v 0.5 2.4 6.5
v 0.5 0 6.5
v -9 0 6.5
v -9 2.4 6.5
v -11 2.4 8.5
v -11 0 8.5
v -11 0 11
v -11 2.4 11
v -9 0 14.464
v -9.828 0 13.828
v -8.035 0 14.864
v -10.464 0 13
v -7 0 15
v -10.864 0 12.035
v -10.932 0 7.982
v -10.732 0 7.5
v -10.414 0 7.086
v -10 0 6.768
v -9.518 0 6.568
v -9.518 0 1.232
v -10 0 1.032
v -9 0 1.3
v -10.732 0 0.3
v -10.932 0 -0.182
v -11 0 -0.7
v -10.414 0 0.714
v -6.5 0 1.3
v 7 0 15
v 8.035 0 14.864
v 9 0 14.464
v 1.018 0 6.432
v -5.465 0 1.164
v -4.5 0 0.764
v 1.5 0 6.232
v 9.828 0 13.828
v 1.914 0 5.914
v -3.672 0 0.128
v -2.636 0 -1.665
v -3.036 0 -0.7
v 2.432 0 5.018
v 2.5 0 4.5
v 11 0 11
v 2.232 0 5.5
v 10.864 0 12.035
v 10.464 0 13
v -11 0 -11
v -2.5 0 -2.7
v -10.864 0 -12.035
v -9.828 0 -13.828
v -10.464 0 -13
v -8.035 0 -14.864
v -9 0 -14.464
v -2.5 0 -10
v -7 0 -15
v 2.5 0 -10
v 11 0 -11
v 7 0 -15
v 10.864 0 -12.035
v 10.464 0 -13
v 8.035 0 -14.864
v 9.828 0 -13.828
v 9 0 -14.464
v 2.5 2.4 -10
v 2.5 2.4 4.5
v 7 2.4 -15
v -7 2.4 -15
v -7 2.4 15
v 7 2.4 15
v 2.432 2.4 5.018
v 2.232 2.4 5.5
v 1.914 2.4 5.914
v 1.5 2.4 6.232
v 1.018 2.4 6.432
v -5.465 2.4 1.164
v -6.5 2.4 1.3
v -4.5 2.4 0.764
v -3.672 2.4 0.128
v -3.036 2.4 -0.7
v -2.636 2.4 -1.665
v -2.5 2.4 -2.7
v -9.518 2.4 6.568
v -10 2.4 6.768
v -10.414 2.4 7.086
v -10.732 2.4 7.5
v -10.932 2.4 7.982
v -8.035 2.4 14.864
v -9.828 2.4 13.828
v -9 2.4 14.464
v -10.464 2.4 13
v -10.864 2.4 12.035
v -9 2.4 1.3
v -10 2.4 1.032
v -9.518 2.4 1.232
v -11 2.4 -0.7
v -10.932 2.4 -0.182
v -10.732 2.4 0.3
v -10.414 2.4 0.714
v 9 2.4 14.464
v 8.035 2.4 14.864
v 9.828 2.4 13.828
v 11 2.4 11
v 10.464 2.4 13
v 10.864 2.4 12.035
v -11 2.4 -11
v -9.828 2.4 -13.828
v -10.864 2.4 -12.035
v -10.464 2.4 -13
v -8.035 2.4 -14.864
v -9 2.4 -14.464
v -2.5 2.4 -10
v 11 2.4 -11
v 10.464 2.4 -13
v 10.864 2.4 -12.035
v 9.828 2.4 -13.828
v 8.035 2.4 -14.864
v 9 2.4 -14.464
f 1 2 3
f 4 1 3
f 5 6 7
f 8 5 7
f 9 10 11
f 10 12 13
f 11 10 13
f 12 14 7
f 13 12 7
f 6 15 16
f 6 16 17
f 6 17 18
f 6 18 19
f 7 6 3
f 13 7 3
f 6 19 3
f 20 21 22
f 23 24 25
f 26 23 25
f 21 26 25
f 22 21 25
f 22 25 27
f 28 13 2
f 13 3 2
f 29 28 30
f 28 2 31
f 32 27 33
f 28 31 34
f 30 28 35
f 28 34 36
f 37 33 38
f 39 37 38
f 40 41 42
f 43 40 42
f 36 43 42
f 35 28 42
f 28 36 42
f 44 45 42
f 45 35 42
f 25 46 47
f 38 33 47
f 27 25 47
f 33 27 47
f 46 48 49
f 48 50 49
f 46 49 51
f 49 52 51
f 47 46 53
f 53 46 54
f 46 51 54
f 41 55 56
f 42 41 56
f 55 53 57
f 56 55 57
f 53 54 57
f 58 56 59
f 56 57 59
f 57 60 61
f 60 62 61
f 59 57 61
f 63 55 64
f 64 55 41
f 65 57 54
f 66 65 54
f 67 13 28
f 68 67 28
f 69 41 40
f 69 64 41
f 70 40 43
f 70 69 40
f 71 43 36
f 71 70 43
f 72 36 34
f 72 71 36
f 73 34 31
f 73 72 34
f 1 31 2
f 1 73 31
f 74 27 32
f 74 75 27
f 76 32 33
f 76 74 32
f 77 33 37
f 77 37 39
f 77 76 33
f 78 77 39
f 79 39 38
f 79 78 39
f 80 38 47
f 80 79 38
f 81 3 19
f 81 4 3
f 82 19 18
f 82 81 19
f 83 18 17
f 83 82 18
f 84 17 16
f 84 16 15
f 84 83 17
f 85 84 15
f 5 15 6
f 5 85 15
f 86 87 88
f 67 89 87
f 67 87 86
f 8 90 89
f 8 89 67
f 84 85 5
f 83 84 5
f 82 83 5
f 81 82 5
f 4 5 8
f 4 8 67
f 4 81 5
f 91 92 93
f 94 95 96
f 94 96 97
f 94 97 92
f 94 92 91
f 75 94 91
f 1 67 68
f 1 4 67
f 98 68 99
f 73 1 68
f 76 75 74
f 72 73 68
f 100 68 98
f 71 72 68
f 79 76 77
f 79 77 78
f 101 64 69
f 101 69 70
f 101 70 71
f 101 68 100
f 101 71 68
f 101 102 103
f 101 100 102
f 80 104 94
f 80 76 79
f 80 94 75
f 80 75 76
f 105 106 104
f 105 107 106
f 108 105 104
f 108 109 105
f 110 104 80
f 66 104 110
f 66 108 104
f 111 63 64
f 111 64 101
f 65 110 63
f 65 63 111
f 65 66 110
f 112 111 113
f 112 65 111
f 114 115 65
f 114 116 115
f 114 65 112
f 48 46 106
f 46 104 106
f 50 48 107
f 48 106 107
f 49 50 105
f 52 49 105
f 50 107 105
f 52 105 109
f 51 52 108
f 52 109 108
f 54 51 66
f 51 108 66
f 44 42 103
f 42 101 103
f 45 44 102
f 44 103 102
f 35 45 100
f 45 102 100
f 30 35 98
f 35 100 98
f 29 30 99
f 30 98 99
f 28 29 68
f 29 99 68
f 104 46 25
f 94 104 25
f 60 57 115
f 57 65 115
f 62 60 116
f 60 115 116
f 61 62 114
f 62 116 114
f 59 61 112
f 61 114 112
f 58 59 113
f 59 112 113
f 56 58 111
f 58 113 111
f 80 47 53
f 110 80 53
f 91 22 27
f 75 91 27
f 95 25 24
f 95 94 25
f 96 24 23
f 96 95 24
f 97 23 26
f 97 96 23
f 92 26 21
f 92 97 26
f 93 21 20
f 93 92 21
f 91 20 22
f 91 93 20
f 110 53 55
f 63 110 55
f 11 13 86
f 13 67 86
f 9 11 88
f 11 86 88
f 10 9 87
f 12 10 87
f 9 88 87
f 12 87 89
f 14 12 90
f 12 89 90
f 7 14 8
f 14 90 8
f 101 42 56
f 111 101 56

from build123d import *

# Parameters (mm, degrees)
BOSS_EXTRUDE1_DEPTH = 2.4
FILLET1_R           = 4
FILLET2_R           = 4
FILLET3_R           = 2


with BuildPart() as part:
    # Sketch1 → Boss-Extrude1 (new body)
    with BuildSketch(Plane(origin=(0, 0, 0), x_dir=(1, 0, 0), z_dir=(0, 1, 0))):
        Polygon((-11, -15), (11, -15), (11, 15), (-11, 15), (-11, -1.3), (-2.5, -1.3), (-2.5, 10), (2.5, 10), (2.5, -6.5), (-2.5, -6.5), (-11, -6.5), align=None)
    extrude(amount=BOSS_EXTRUDE1_DEPTH)

    # Fillet1
    fillet1_edges = [part.edges().sort_by_distance(p)[0] for p in [
        (-2.5, 1.2, 1.3),
    ]]
    fillet(fillet1_edges, radius=FILLET1_R)

    # Fillet2
    fillet2_edges = [part.edges().sort_by_distance(p)[0] for p in [
        (11, 1.2, 15),
        (-11, 1.2, 15),
        (-11, 1.2, -15),
        (11, 1.2, -15),
    ]]
    fillet(fillet2_edges, radius=FILLET2_R)

    # Fillet3
    fillet3_edges = [part.edges().sort_by_distance(p)[0] for p in [
        (-11, 1.2, 6.5),
        (2.5, 1.2, 6.5),
        (-11, 1.2, 1.3),
    ]]
    fillet(fillet3_edges, radius=FILLET3_R)


solid = part.part
